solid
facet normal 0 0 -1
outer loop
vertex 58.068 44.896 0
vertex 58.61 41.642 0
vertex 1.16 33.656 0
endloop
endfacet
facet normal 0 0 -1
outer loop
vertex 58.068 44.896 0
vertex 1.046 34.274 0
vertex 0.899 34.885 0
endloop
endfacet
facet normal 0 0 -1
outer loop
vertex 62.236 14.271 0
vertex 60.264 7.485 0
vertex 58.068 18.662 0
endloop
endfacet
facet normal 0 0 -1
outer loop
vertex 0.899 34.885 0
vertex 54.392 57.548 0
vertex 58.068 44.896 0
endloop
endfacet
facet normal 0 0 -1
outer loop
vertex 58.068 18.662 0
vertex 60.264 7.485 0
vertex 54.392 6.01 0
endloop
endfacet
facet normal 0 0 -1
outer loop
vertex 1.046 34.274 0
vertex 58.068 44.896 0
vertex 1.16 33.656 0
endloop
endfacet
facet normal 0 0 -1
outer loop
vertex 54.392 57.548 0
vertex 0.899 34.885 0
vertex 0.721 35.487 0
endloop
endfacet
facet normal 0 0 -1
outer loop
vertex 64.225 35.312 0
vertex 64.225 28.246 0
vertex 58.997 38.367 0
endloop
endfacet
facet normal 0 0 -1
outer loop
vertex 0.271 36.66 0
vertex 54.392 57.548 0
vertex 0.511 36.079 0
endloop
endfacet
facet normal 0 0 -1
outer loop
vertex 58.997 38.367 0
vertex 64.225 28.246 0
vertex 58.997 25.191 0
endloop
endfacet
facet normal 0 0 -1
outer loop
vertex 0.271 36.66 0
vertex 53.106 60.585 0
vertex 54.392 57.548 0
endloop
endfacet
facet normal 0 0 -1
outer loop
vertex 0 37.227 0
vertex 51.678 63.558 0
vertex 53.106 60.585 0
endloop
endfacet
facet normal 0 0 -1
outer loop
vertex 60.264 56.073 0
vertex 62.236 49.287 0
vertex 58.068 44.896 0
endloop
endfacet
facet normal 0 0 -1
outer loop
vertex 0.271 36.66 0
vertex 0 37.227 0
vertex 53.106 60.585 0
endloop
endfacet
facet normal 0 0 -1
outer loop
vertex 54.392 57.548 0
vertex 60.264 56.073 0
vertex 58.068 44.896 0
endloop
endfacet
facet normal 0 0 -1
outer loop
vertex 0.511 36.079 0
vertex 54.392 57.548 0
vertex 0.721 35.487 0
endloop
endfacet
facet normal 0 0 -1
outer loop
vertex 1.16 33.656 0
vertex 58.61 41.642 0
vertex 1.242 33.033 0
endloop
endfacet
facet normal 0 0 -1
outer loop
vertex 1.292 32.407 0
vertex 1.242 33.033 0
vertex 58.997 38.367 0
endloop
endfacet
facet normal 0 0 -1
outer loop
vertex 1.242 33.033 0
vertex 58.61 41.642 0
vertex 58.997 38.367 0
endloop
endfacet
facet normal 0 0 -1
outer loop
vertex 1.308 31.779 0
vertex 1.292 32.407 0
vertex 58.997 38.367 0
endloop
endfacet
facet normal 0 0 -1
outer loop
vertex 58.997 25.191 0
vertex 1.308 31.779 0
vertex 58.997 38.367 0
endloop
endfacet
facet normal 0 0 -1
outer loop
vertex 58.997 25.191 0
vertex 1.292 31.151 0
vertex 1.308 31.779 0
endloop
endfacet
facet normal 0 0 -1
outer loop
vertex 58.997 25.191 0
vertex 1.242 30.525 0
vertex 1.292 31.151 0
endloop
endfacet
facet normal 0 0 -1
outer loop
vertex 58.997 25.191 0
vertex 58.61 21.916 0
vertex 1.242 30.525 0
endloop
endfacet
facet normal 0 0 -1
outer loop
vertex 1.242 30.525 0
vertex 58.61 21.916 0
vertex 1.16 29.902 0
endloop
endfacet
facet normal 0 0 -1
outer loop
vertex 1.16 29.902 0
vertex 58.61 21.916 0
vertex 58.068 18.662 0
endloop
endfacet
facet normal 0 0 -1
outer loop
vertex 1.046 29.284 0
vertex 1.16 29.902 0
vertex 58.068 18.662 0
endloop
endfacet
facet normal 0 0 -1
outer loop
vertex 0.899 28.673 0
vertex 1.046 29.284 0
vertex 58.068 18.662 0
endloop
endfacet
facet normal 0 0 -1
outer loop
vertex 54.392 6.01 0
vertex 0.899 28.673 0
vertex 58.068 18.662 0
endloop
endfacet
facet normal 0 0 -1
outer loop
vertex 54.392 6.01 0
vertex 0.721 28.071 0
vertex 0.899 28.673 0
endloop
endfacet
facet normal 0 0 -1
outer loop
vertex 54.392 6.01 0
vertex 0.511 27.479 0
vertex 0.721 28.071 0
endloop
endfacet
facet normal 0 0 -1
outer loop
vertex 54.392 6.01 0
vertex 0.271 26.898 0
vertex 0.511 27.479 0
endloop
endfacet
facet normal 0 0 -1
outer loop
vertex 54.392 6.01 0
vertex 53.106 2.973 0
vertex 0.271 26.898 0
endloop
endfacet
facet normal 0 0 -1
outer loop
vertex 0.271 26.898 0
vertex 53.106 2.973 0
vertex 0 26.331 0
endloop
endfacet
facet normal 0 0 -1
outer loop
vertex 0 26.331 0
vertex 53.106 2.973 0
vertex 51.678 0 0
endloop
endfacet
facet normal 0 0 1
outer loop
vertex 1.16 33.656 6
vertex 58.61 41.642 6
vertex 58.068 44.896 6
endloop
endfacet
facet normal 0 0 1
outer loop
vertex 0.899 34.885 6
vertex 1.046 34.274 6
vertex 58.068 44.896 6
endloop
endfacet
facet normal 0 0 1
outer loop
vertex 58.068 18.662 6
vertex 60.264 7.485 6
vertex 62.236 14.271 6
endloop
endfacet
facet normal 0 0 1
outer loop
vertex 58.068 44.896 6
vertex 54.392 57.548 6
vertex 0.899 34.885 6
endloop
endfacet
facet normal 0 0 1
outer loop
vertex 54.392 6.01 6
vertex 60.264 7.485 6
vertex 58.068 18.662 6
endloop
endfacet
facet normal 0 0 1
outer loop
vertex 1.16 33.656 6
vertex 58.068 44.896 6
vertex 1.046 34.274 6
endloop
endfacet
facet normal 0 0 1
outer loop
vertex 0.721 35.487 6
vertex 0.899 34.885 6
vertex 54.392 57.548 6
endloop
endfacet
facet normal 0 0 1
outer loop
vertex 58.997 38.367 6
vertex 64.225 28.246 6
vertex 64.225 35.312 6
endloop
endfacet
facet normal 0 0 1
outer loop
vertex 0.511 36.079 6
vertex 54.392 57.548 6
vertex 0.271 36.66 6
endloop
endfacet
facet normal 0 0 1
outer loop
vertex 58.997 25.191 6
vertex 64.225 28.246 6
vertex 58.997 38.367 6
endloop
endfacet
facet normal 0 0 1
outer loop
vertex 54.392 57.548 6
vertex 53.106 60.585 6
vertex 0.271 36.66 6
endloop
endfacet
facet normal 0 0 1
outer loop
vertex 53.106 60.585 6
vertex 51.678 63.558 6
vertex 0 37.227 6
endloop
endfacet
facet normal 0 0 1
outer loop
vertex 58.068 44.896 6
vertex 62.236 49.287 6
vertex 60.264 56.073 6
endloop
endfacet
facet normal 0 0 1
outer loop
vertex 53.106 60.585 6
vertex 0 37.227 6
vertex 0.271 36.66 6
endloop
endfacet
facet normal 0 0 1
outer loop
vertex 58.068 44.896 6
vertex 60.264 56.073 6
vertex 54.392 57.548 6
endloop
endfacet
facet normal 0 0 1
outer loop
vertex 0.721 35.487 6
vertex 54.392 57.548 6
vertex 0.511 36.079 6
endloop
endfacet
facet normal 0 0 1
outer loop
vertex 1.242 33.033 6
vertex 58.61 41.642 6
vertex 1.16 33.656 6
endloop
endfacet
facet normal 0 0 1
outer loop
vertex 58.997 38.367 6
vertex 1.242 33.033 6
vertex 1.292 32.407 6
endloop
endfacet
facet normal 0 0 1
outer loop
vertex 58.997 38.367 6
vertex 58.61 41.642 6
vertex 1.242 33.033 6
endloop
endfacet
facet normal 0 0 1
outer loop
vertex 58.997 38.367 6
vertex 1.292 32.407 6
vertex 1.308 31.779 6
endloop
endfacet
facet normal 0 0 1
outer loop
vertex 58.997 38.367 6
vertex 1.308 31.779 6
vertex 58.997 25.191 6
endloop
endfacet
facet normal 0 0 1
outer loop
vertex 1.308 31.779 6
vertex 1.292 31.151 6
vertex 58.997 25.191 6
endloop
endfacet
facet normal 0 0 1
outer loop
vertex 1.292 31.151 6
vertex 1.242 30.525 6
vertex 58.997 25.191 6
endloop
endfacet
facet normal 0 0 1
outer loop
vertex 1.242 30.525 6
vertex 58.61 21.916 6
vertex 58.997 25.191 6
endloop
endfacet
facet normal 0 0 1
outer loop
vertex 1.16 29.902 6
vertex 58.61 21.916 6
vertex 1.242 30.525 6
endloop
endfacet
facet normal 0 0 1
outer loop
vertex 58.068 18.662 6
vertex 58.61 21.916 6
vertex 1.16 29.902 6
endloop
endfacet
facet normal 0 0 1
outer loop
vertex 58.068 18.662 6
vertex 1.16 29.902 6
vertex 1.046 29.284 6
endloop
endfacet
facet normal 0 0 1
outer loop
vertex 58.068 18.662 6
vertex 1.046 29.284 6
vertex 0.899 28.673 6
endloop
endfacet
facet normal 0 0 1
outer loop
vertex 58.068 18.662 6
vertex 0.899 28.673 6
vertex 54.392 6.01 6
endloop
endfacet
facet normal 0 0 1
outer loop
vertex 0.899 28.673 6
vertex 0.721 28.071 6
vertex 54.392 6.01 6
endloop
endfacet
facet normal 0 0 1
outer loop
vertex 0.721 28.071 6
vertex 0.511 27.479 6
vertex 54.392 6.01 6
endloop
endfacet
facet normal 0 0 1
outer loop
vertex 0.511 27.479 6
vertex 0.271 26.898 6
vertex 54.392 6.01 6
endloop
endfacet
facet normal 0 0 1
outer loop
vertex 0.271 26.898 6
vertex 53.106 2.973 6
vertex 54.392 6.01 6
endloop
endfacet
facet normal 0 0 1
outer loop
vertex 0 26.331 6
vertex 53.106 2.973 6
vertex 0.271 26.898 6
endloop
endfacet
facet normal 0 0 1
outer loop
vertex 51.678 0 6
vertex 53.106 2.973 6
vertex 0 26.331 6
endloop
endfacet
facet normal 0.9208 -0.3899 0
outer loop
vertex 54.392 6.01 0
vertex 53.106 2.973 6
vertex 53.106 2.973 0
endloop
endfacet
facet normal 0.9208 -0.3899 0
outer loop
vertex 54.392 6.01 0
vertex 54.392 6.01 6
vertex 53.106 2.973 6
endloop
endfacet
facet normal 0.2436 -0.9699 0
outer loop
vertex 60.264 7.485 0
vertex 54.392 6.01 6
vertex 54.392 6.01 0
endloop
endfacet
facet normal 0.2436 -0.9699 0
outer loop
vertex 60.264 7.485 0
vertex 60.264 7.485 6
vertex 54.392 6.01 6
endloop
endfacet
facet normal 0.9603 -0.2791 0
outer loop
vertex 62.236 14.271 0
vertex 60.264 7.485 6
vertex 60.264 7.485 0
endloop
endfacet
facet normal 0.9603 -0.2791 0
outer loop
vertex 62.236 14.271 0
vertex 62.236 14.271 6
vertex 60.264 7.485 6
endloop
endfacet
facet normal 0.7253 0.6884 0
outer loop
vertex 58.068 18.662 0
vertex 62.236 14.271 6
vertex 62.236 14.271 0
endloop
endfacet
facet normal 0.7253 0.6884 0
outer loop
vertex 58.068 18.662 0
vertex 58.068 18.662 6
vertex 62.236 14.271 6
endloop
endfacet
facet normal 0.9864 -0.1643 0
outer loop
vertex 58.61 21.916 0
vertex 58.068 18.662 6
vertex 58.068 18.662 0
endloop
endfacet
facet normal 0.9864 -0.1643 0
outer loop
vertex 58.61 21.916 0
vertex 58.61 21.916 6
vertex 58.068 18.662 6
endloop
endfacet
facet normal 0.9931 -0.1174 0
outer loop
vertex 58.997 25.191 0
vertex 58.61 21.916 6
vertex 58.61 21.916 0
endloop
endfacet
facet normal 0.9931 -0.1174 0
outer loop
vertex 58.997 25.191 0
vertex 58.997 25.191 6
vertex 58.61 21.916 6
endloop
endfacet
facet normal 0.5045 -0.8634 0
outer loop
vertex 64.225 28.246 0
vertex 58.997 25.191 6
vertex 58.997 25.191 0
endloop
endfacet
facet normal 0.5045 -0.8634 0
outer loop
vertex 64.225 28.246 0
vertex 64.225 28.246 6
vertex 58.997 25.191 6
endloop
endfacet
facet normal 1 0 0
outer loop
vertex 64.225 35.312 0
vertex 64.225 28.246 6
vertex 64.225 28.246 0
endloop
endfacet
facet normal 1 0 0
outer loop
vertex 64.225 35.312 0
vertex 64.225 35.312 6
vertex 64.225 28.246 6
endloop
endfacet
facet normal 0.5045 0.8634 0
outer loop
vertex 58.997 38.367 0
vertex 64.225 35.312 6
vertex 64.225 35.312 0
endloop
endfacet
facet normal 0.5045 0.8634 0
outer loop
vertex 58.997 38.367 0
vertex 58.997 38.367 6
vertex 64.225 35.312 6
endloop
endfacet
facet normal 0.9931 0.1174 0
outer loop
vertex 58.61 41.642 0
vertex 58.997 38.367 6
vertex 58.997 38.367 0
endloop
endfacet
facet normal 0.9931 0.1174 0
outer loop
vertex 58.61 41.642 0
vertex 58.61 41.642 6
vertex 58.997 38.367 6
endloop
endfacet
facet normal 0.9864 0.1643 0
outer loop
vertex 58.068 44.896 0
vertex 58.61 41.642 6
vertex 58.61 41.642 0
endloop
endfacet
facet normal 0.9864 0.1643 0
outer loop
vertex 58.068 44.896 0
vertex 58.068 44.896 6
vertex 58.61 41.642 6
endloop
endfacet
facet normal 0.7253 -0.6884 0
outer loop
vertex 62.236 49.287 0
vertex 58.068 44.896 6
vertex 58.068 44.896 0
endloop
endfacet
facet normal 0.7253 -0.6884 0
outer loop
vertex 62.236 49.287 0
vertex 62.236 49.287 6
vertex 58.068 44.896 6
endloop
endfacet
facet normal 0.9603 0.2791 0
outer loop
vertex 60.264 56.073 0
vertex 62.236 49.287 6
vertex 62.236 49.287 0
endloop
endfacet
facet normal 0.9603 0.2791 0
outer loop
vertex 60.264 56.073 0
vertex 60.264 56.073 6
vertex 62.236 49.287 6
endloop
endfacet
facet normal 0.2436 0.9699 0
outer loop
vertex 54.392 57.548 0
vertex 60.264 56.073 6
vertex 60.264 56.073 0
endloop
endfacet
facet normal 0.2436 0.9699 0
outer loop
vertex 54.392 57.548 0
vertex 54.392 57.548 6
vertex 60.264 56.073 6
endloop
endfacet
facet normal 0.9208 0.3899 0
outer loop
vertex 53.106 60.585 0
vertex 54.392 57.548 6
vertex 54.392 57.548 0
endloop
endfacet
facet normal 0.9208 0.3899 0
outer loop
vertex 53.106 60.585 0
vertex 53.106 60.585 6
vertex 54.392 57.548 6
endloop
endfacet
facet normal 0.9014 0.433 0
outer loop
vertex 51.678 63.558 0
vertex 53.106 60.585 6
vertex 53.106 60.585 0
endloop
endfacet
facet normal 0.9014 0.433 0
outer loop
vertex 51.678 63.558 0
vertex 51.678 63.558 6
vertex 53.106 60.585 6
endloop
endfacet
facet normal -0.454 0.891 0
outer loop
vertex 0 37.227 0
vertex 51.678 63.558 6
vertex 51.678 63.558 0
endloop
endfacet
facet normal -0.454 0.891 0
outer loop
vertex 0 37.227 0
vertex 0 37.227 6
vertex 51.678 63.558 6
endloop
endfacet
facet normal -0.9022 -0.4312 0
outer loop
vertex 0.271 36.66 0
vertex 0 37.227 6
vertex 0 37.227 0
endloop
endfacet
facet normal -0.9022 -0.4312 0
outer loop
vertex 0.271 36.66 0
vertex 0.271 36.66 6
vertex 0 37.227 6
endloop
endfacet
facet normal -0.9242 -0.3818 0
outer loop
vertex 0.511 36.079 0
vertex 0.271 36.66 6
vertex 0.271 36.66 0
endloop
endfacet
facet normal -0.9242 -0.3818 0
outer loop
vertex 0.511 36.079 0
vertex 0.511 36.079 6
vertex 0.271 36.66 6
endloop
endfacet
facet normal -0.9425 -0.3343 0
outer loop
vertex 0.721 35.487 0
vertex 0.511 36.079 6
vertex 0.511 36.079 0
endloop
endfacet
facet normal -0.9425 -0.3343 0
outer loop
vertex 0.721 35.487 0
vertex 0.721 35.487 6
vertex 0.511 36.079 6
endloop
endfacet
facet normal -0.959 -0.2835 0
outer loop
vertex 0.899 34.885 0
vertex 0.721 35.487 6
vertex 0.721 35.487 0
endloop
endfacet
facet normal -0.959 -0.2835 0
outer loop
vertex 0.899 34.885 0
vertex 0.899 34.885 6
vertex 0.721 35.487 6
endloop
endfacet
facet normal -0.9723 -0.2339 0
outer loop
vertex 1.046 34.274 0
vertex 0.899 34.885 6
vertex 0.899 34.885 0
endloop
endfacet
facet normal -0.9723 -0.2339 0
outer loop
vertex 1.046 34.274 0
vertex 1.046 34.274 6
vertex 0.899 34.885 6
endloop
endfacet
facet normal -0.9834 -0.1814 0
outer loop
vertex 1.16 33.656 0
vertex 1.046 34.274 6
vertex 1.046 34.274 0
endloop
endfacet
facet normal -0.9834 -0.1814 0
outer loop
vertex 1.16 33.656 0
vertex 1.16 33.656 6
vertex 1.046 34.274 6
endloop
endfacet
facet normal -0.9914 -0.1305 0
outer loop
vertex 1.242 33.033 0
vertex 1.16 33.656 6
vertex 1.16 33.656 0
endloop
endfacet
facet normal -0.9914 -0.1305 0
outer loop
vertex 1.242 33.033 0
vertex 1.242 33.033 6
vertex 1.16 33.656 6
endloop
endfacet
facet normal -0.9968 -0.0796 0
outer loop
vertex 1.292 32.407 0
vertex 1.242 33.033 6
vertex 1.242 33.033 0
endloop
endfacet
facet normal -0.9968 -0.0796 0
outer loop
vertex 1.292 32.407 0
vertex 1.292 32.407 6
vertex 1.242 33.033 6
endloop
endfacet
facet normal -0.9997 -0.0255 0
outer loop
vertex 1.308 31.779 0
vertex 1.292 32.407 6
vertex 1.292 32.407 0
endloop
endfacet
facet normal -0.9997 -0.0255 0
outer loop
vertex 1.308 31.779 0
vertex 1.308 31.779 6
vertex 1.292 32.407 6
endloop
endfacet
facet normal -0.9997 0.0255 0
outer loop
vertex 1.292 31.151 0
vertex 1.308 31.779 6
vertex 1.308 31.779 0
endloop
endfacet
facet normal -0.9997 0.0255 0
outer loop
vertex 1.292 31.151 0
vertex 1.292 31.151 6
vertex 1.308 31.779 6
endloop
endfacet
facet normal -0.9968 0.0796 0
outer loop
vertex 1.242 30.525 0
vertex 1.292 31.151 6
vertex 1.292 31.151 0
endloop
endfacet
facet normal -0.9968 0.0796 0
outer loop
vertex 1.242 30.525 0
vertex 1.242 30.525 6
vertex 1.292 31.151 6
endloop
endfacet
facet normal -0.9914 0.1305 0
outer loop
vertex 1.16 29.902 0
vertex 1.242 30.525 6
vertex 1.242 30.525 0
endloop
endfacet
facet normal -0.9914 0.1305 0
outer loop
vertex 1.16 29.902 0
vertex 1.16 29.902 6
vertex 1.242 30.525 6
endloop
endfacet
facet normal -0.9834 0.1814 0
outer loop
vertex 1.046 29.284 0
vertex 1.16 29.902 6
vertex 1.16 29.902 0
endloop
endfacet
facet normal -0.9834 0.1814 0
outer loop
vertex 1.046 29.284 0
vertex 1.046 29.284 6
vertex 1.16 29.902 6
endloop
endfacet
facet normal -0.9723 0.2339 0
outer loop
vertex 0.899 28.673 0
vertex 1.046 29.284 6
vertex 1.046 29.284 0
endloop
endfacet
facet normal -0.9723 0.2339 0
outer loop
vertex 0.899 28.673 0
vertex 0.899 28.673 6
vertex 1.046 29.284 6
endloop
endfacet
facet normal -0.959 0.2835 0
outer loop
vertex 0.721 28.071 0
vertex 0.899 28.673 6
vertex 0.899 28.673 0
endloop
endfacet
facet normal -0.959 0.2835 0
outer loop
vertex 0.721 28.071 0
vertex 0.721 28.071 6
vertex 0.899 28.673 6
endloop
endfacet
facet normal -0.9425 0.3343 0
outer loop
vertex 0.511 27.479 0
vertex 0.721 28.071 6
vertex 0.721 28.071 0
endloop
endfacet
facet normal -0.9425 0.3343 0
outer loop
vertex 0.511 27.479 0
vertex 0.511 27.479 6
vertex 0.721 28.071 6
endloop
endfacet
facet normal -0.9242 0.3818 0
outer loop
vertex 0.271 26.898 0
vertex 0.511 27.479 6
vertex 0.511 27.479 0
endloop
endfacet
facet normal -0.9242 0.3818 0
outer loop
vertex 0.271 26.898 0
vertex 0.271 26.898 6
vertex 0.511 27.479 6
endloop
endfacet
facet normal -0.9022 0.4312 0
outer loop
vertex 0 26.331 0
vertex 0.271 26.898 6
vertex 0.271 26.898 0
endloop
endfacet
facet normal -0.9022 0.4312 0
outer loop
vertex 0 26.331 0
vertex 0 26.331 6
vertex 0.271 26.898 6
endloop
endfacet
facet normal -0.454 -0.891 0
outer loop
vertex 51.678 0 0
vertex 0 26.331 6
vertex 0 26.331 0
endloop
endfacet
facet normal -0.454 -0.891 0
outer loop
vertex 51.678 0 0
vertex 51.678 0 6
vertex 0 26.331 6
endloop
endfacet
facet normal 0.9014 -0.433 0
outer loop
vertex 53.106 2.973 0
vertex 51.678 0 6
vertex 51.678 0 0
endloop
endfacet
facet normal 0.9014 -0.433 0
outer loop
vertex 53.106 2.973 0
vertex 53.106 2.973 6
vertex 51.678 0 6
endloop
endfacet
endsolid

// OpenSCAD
$fn = 32;

// ----------------------------------------------------------------------
// Gear sector: 3 teeth on 54 degrees
// ----------------------------------------------------------------------

// --- parameters (mm) ---
sector_angle = 54;        // sector angle, degrees
root_r = 70;              // root circle radius
tooth_h = 5;              // tooth height over the root circle
teeth = 3;                // number of teeth on the sector
hub_r = 12;               // hub bore radius
plate_t = 6;              // sector thickness, Z
arc_step = 3;             // sampling step of the root/hub arcs, degrees

tip_r = root_r + tooth_h;  // tip circle radius

profile = [[51.678, 0], [53.106, 2.973], [54.392, 6.01], [60.264, 7.485], [62.236, 14.271], [58.068, 18.662], [58.61, 21.916], [58.997, 25.191], [64.225, 28.246], [64.225, 35.312], [58.997, 38.367], [58.61, 41.642], [58.068, 44.896], [62.236, 49.287], [60.264, 56.073], [54.392, 57.548], [53.106, 60.585], [51.678, 63.558], [0, 37.227], [0.271, 36.66], [0.511, 36.079], [0.721, 35.487], [0.899, 34.885], [1.046, 34.274], [1.16, 33.656], [1.242, 33.033], [1.292, 32.407], [1.308, 31.779], [1.292, 31.151], [1.242, 30.525], [1.16, 29.902], [1.046, 29.284], [0.899, 28.673], [0.721, 28.071], [0.511, 27.479], [0.271, 26.898], [0, 26.331]];  // primary outline, 37 points, counter clockwise

// --- the one profile operation ---
linear_extrude(height = plate_t) polygon(points = profile);
